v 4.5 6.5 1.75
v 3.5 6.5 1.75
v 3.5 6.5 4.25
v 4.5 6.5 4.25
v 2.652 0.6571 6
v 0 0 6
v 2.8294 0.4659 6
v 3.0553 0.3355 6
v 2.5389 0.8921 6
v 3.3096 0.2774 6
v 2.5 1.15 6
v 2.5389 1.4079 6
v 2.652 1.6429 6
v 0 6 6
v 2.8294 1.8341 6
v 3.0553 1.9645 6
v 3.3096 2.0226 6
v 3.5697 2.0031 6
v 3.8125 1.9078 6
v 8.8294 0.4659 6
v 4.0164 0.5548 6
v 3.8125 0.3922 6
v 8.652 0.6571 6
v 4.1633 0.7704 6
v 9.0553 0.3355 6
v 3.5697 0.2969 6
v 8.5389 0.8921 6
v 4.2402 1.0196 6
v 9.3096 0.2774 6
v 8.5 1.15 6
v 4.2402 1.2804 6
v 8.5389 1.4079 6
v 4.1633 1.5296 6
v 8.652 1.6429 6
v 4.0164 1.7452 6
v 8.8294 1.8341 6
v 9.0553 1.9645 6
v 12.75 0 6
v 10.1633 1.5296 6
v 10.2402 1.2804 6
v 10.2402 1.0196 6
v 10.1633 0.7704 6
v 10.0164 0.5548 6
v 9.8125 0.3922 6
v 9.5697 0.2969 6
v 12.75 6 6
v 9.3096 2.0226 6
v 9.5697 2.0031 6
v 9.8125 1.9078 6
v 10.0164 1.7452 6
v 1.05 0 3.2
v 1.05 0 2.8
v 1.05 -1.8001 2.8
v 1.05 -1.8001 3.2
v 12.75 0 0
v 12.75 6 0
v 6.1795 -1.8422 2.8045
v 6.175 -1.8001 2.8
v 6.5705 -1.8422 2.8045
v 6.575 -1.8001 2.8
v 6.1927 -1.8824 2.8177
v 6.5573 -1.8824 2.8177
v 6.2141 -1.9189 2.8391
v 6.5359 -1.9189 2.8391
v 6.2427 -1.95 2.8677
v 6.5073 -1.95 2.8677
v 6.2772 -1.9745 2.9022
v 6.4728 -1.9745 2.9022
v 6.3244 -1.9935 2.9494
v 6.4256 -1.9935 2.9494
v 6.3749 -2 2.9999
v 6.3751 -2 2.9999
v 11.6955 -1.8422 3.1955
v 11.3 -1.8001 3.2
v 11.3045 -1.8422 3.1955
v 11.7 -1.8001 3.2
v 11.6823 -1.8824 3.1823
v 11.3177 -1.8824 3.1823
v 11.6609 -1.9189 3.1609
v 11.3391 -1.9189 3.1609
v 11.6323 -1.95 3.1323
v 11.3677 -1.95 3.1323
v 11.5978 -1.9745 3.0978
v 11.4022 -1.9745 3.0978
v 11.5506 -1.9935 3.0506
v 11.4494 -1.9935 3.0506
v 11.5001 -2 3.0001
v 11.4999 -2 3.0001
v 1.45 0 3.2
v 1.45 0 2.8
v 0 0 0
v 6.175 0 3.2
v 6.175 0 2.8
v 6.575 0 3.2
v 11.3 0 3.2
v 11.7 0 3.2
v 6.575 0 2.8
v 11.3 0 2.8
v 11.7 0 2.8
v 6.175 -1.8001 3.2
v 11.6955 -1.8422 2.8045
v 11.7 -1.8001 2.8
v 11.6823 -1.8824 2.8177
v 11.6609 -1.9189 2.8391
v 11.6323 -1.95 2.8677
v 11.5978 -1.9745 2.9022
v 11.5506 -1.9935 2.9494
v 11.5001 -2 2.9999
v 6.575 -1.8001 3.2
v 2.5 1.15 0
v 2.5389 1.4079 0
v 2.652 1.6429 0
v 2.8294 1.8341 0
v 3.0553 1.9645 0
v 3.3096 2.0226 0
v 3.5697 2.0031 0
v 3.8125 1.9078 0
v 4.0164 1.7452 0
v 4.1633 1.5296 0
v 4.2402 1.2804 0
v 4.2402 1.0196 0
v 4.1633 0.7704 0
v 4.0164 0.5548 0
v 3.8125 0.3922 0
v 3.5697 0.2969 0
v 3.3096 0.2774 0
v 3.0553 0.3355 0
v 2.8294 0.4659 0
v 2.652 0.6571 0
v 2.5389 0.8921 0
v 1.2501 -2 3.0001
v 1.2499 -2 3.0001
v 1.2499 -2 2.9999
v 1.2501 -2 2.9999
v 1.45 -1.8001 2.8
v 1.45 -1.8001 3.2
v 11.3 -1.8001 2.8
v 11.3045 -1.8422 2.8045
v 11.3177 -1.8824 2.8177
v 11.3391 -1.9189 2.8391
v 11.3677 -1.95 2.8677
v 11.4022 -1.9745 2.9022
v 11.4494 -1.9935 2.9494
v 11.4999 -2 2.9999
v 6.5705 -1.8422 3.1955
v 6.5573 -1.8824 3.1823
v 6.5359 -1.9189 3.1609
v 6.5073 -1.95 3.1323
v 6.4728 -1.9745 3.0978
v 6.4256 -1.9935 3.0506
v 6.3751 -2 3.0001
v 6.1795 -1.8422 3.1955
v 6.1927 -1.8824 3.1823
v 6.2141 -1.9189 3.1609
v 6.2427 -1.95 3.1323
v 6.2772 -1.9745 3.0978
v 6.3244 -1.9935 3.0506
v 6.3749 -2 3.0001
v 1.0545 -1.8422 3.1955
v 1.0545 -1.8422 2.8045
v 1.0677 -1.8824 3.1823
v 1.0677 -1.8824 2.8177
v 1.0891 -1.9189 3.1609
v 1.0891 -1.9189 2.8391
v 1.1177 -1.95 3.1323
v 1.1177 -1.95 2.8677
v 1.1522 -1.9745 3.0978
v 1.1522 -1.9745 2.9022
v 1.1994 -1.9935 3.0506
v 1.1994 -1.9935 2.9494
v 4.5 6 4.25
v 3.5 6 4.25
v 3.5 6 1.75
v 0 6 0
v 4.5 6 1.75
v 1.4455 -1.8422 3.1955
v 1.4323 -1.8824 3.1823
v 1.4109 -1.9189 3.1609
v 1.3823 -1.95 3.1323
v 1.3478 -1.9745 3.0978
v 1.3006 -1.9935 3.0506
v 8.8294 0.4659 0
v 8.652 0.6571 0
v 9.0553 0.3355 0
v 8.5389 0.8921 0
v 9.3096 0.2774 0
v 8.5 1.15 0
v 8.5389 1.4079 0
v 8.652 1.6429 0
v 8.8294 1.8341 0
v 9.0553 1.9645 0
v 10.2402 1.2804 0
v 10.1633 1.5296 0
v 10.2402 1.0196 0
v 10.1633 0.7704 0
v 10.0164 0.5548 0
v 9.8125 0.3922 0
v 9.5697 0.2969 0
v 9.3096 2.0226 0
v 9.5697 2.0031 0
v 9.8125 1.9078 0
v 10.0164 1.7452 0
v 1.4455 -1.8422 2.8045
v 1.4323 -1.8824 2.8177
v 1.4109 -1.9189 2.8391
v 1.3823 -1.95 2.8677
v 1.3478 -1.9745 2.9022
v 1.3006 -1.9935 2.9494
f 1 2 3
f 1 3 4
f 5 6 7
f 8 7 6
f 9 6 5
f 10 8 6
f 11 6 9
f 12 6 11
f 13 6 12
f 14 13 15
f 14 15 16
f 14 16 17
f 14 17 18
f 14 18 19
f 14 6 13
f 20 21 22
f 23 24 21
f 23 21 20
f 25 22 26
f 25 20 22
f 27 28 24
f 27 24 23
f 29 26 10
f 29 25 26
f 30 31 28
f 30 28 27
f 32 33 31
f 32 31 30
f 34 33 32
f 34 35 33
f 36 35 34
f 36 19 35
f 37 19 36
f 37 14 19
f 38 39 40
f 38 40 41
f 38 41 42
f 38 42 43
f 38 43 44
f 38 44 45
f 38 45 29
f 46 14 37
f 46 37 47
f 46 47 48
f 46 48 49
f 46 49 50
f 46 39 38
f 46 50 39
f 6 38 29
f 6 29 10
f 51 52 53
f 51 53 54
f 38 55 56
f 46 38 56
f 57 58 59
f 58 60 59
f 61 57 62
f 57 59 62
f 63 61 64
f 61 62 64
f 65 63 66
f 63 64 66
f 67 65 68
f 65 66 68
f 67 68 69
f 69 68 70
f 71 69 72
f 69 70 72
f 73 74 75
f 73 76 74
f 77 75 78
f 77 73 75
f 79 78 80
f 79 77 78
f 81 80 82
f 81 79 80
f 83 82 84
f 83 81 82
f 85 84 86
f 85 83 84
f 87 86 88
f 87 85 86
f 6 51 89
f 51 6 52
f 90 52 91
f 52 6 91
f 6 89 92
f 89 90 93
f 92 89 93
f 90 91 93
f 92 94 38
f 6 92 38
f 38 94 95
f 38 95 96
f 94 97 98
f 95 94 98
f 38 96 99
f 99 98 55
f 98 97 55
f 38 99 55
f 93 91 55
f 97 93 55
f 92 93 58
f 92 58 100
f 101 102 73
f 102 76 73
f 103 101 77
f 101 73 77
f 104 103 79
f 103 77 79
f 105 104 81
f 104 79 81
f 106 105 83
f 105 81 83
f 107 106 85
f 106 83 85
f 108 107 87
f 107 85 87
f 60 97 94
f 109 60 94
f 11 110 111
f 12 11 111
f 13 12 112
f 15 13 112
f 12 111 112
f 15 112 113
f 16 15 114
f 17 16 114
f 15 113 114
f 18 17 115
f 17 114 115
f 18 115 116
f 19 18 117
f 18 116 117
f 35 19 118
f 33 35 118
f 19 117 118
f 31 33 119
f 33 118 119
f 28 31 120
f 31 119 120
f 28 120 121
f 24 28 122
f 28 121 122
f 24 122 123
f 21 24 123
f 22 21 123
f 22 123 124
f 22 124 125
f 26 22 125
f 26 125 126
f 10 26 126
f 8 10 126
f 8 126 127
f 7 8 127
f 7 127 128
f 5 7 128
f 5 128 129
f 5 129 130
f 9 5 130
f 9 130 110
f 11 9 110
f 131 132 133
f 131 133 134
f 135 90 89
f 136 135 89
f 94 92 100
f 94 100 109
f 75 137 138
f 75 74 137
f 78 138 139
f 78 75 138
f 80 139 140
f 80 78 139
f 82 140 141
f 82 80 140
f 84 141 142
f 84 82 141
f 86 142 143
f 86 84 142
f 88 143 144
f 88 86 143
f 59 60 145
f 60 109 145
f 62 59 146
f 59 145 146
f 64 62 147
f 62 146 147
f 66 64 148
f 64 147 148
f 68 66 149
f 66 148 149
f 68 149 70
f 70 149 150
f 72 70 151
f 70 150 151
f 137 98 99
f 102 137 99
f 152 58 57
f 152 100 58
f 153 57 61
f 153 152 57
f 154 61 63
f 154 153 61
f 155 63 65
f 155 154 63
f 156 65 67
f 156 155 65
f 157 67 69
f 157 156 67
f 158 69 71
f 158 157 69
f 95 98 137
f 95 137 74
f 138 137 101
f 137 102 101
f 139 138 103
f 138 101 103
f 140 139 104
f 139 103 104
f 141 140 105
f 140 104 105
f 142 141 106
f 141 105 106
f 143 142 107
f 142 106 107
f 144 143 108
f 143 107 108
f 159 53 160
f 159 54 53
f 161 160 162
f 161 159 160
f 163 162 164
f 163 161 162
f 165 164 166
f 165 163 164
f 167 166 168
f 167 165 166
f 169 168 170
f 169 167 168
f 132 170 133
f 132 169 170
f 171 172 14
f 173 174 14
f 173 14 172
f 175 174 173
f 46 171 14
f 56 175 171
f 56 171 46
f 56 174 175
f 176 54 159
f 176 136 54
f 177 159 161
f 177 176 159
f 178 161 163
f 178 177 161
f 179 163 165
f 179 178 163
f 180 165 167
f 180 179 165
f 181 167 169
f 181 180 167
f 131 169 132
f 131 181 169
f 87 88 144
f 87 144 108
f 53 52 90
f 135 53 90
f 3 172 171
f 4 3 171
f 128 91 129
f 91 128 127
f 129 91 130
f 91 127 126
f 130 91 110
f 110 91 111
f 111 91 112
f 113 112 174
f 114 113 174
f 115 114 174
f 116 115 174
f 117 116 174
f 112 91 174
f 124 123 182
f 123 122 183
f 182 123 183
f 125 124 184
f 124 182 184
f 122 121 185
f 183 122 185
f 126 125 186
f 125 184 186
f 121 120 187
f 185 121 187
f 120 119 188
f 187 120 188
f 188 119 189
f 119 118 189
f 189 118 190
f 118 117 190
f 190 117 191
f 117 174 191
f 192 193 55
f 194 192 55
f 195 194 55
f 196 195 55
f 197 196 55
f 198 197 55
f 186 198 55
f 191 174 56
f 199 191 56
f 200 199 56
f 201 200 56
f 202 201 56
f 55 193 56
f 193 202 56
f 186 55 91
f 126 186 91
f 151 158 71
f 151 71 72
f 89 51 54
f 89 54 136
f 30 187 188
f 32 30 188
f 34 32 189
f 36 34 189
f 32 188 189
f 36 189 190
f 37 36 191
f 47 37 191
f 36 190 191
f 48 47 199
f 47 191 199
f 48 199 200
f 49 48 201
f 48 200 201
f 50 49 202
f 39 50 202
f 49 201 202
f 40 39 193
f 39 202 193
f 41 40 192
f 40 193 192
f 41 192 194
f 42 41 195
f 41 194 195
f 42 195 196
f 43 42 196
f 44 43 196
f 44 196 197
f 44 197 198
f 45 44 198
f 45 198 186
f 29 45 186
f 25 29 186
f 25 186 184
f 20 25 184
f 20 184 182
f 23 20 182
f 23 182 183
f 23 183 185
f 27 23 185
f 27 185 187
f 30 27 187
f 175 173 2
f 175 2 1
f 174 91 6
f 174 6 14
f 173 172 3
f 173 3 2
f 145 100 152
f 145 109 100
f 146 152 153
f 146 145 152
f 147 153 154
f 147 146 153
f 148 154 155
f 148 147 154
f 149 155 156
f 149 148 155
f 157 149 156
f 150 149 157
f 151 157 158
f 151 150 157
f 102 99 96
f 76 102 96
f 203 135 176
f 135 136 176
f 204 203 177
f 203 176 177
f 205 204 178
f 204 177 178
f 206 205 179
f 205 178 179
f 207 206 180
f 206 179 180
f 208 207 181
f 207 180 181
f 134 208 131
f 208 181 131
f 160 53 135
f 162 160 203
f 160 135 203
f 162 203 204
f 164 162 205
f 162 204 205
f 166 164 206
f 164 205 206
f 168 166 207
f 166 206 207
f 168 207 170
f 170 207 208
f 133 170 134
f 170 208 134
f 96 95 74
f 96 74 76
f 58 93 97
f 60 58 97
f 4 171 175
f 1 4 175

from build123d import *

# Parameters (mm, degrees)
SKETCH1_W             = 12.75
SKETCH1_H             = 6
BOSS_EXTRUDE1_DEPTH   = 6
F_1_0MM_DOWEL_HOLE1_D = 1.75
SKETCH4_W             = 1
SKETCH4_H             = 2.5
BOSS_EXTRUDE2_DEPTH   = 0.5
SKETCH7_W             = 0.4
SKETCH7_H             = 0.4
EXTRUDE_THIN6_DEPTH   = 2
FILLET9_R             = 0.2


with BuildPart() as part:
    # Sketch1 → Boss-Extrude1 (new body)
    with BuildSketch(Plane.XY):
        with Locations((6.375, 3)):
            Rectangle(SKETCH1_W, SKETCH1_H)
    extrude(amount=BOSS_EXTRUDE1_DEPTH)

    # Ø1.0mm Dowel Hole1 (through all)
    with Locations(Plane.XY.offset(6)):
        with Locations((3.375, 1.15), (9.375, 1.15)):
            Hole(F_1_0MM_DOWEL_HOLE1_D / 2)

    # Sketch4 → Boss-Extrude2 (add)
    with BuildSketch(Plane(origin=(0, 6, 0), x_dir=(1, 0, 0), z_dir=(0, 1, 0))):
        with Locations((4, -3)):
            Rectangle(SKETCH4_W, SKETCH4_H)
    extrude(amount=BOSS_EXTRUDE2_DEPTH)

    # Sketch7 → Extrude-Thin6 (add)
    with BuildSketch(Plane.XZ):
        with Locations((11.5, 3)):
            Rectangle(SKETCH7_W, SKETCH7_H)
        with Locations((6.375, 3)):
            Rectangle(SKETCH7_W, SKETCH7_H)
        with Locations((1.25, 3)):
            Rectangle(SKETCH7_W, SKETCH7_H)
    extrude(amount=EXTRUDE_THIN6_DEPTH)

    # Fillet9
    fillet9_edges = [part.edges().sort_by_distance(p)[0] for p in [
        (6.575, -2, 3),
        (6.375, -2, 3.2),
        (6.175, -2, 3),
        (6.375, -2, 2.8),
        (1.45, -2, 3),
        (1.25, -2, 3.2),
        (1.05, -2, 3),
        (1.25, -2, 2.8),
        (11.3, -2, 3),
        (11.5, -2, 2.8),
        (11.7, -2, 3),
        (11.5, -2, 3.2),
    ]]
    fillet(fillet9_edges, radius=FILLET9_R - 0.0001)  # a hair under: the kernel refuses the full size


solid = part.part
